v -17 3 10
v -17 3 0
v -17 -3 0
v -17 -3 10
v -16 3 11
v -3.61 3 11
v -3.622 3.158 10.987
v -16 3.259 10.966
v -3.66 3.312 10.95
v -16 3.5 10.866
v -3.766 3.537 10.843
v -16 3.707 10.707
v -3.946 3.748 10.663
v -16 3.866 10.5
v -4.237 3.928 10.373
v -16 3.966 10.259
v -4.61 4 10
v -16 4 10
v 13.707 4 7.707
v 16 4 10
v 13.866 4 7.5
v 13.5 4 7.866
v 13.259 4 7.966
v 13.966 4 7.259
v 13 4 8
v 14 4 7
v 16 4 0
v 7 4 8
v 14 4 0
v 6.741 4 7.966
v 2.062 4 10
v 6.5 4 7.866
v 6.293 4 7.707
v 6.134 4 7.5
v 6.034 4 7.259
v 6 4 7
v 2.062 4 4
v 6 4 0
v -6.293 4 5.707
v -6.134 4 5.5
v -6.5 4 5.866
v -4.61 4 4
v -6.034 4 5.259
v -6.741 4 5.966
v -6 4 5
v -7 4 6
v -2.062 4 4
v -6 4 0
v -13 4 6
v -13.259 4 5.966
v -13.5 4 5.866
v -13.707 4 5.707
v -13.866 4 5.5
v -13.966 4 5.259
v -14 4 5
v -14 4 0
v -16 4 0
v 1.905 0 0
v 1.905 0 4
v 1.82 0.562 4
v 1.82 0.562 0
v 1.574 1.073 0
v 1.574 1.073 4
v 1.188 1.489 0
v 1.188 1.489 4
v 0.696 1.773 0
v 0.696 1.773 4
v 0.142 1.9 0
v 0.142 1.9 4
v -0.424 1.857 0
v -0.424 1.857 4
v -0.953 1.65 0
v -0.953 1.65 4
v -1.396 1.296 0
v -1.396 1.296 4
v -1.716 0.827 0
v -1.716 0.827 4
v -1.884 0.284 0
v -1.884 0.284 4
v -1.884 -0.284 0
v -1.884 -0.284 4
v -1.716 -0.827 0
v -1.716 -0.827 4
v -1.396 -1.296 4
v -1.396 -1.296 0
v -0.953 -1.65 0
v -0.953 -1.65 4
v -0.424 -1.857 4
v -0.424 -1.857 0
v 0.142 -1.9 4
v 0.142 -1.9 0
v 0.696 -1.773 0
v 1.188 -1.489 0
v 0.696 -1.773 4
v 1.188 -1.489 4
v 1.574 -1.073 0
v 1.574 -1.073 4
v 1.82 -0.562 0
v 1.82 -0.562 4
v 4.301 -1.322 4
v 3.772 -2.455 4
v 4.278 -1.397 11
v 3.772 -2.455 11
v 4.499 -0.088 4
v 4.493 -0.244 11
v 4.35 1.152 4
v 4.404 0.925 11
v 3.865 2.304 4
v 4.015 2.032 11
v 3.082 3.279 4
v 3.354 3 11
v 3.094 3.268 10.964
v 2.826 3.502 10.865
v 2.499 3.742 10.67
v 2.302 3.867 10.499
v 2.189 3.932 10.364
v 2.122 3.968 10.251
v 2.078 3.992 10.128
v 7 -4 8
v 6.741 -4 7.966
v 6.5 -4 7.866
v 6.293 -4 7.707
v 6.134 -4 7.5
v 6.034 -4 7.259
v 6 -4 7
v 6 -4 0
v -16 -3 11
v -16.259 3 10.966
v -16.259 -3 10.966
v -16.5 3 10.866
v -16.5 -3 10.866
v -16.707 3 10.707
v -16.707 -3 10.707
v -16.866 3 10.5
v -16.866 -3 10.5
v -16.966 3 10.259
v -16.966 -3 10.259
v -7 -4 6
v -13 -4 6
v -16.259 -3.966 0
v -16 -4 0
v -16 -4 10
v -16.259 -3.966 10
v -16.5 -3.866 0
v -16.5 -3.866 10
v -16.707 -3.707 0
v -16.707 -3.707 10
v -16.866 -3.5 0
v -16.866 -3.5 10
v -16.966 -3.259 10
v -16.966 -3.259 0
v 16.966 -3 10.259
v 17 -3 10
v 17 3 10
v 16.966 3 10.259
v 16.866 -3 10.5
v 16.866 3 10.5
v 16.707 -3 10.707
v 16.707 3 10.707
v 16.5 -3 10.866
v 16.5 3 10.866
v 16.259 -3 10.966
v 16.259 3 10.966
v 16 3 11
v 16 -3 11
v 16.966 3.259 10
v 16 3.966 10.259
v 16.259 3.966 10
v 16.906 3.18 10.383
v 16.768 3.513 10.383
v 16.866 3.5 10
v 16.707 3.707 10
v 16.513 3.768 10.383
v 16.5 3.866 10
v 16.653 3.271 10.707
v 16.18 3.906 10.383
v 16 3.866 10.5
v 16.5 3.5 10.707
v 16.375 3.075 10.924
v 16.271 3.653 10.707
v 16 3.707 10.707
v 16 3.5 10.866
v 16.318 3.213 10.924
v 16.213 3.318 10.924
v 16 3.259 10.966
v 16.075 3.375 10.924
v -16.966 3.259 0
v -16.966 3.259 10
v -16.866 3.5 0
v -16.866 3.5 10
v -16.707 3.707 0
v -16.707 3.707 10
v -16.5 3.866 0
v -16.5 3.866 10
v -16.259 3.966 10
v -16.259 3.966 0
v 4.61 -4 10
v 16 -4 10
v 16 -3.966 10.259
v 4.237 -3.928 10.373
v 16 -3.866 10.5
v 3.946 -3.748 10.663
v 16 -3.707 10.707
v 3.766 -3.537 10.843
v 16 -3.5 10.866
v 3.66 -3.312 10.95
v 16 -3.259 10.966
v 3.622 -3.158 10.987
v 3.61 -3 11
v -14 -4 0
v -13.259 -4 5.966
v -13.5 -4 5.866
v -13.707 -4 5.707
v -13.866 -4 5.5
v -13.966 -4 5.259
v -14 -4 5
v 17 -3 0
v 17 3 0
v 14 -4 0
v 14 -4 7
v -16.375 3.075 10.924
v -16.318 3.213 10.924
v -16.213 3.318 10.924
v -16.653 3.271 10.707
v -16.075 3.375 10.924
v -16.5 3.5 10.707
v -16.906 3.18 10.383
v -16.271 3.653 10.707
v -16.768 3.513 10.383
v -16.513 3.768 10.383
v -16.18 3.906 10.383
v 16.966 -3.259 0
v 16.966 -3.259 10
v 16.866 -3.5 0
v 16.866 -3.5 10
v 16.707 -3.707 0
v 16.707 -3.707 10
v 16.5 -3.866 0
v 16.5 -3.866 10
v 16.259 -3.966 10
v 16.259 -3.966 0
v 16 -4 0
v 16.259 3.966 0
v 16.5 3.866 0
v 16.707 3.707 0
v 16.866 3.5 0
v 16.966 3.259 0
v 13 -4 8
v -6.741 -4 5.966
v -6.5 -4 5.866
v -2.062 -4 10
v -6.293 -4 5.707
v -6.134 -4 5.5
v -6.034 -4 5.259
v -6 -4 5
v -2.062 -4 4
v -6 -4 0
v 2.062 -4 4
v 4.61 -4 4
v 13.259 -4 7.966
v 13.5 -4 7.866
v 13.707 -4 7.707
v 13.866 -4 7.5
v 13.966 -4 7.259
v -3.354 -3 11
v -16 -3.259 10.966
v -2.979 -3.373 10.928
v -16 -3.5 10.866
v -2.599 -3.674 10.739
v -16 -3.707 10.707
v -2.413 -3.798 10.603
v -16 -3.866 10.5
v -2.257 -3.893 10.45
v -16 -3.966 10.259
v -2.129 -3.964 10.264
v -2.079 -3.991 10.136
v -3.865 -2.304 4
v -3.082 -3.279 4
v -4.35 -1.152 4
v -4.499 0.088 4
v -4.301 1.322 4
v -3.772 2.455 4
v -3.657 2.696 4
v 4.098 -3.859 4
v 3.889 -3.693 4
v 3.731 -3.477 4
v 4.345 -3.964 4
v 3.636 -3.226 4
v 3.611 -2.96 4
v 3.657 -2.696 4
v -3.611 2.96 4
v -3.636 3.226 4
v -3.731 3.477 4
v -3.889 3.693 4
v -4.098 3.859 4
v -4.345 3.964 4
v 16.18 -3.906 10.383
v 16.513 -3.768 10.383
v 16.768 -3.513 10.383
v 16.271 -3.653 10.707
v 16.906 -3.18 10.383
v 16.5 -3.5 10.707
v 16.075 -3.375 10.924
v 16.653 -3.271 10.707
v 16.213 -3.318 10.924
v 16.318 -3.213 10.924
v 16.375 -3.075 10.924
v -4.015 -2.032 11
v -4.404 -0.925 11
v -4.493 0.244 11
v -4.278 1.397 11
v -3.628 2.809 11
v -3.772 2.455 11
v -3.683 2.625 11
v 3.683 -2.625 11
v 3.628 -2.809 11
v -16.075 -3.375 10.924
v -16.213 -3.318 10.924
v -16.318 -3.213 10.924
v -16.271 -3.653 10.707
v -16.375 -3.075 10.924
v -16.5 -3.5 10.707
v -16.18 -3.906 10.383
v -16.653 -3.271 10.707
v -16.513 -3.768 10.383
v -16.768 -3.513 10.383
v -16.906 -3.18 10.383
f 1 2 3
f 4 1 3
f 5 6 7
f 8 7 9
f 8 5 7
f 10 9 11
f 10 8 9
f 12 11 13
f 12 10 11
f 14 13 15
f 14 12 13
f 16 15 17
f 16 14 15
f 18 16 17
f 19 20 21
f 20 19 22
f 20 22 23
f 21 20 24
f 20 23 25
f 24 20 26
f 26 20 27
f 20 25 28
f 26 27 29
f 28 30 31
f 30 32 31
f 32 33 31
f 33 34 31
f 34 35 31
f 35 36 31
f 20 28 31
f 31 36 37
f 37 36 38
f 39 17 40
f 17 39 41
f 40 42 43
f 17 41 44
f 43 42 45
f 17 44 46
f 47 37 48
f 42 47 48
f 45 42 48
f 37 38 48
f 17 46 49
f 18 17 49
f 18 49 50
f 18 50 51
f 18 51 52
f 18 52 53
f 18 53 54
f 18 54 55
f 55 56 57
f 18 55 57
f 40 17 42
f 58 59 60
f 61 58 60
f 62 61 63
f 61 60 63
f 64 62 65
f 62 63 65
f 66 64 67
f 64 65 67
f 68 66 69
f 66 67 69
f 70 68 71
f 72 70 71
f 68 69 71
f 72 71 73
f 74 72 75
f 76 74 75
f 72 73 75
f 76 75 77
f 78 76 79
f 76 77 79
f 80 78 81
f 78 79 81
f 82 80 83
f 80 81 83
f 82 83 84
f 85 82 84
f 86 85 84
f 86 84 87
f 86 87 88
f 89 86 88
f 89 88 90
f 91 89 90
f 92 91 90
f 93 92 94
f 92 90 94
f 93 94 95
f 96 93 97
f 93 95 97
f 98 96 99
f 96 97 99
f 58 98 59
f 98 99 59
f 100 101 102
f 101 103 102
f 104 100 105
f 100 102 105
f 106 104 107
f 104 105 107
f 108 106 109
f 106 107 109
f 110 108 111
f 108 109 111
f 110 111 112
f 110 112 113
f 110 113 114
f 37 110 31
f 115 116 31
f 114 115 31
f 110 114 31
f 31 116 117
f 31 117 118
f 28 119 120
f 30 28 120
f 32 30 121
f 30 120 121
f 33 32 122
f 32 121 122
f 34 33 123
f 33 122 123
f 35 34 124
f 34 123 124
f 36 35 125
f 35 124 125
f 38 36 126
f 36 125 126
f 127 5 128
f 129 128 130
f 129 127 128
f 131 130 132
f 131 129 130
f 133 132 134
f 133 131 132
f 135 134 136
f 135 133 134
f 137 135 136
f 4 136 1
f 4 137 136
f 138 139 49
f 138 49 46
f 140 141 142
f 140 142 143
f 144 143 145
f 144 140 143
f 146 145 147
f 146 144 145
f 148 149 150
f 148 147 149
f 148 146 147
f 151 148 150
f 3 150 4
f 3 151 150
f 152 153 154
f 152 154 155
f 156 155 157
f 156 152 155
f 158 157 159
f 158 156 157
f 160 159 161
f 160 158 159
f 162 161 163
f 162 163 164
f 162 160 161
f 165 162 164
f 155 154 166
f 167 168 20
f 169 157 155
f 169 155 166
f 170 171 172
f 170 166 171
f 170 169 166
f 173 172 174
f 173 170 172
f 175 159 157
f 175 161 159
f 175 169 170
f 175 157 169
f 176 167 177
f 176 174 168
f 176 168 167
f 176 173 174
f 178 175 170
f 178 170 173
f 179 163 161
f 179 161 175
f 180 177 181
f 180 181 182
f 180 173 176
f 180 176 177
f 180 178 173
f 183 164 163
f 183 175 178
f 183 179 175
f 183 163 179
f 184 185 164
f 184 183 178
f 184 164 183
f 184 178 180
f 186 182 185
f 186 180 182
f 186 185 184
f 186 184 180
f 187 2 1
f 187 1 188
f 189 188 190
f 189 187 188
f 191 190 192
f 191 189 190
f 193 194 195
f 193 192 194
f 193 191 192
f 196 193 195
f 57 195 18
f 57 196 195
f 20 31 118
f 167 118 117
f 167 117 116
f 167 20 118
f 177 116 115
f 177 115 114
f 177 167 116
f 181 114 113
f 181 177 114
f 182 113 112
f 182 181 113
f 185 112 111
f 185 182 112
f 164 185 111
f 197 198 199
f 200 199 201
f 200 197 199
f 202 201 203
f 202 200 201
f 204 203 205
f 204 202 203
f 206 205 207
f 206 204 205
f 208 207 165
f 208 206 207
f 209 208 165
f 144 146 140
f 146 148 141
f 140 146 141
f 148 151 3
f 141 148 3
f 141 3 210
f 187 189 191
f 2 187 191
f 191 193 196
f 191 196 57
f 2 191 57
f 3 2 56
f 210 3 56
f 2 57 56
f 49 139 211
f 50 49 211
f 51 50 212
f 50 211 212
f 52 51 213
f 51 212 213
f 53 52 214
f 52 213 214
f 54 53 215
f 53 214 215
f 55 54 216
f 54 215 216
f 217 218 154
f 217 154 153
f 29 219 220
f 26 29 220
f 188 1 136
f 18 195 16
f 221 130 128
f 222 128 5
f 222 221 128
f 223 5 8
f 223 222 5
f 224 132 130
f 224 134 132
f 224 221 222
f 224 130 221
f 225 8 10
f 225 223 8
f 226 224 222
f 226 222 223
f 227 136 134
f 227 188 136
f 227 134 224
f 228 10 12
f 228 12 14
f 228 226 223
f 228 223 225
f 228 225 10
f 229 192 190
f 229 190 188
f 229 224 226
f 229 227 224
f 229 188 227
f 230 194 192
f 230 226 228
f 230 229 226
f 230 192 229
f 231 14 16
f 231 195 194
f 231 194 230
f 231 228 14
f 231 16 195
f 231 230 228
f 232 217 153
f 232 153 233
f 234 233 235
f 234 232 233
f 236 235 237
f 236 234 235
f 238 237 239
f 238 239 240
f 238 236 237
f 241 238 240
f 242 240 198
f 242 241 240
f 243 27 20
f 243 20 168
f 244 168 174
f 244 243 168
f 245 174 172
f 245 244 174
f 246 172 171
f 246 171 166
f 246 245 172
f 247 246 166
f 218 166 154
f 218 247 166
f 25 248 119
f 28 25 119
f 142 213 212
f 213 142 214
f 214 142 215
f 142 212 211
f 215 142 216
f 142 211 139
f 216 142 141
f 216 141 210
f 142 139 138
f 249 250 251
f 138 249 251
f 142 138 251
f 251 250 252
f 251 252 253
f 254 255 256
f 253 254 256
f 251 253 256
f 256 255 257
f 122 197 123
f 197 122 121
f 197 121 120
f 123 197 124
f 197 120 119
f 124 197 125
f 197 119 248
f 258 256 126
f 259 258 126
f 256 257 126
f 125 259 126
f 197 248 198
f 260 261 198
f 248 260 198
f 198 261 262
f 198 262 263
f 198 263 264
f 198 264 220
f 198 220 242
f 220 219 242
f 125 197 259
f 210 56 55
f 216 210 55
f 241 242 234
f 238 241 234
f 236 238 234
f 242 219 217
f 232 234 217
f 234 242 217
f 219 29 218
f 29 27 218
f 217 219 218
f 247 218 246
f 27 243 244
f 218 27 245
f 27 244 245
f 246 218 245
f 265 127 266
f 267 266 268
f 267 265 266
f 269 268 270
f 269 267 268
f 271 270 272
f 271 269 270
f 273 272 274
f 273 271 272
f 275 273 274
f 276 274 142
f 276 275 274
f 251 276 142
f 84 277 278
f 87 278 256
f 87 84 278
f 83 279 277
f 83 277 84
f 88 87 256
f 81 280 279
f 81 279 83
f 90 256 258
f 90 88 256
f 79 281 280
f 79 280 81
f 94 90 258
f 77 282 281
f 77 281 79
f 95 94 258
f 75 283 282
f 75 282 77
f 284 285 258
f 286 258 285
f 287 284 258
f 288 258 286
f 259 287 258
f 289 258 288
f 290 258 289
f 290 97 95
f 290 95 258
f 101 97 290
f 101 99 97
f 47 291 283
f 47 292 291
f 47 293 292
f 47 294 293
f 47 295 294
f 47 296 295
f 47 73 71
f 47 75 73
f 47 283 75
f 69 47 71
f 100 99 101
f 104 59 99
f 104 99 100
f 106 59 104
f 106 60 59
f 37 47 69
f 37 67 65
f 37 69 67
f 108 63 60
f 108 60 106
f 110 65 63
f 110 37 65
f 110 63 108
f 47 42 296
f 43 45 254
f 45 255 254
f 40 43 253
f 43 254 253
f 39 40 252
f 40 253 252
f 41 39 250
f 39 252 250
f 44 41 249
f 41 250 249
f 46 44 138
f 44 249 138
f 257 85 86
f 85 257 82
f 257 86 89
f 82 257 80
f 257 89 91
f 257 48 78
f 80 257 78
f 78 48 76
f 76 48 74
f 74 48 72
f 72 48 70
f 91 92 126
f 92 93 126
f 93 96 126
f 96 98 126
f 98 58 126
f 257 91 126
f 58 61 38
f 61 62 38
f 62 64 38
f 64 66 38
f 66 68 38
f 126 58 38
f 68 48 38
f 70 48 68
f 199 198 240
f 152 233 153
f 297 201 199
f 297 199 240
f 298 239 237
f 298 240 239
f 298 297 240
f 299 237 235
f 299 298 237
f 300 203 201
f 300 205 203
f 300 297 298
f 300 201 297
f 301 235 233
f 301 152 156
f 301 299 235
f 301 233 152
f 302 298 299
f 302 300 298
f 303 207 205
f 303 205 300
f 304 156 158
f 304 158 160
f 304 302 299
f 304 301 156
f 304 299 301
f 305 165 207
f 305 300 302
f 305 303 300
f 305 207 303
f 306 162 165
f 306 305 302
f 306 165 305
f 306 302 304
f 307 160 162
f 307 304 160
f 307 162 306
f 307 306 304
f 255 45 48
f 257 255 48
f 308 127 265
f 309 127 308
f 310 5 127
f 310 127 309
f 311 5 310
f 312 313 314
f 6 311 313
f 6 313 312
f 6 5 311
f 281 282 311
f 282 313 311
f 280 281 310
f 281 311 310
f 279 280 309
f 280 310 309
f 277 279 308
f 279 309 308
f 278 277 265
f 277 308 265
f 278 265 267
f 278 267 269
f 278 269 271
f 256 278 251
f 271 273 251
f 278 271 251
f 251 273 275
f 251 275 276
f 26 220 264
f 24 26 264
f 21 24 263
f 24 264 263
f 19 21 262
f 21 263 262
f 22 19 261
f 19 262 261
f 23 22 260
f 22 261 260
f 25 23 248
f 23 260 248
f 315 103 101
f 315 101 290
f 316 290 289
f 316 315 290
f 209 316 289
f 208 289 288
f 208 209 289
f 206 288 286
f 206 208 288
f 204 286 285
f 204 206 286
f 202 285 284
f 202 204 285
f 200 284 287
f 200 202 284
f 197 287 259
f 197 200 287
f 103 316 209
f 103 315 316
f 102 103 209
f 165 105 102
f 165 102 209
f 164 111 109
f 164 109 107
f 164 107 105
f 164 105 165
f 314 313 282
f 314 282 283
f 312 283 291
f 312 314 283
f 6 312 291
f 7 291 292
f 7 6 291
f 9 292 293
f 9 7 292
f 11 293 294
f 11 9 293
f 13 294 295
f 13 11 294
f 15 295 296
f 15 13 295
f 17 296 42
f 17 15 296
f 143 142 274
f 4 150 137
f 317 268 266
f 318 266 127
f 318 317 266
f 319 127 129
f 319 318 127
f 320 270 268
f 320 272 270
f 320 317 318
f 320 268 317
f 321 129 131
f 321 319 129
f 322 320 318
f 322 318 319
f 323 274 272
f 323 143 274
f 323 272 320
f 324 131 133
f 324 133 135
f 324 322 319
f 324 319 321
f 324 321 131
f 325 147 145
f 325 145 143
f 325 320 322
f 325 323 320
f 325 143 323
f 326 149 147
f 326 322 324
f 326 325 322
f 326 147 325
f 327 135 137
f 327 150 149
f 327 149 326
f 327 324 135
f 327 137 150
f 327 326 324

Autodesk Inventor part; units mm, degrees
ref_plane "YZ Plane" through (0, 0, 0) normal (1, 0, 0) x (0, 1, 0)
ref_plane "XZ Plane" through (0, 0, 0) normal (0, 1, 0) x (-1, 0, 0)
ref_plane "XY Plane" through (0, 0, 0) normal (0, 0, 1) x (1, 0, 0)
sketch "Sketch1" plane through (0, 0, 0) normal (0, 0, 1) x (1, 0, 0)
  line L0 (0, 4) -> (16, 4)
  line L1 (17, 3) -> (17, -3)
  line L2 (16, -4) -> (0, -4)
  arc A0 (17, 3) -> (16, 4) centre (16, 3) ccw
  arc A1 (16, -4) -> (17, -3) centre (16, -3) ccw
  line L3 (0, 4) -> (-16, 4)
  line L4 (-17, 3) -> (-17, -3)
  line L5 (-16, -4) -> (0, -4)
  arc A2 (-16, 4) -> (-17, 3) centre (-16, 3) ccw
  arc A3 (-17, -3) -> (-16, -4) centre (-16, -3) ccw
  line L6 (0, 4) -> (0, -4)
  point P0 (0, 0)
  point P1 (0, 0)
  dimension "d1" = 17
  dimension "d2" = 1
  dimension "d17" = 17
  dimension "d18" = 4
  dimension "d19" = 4
  dimension "d20" = 1
  dimension "d21" = 8
  dimension "d22" = 4
extrude "Extrusion1" add sketch "Sketch1" along normal blind 11
sketch "Sketch5" plane through (-16, -4, 0) normal (0, -1, 0) x (1, 0, 0)
  line L0 (0, 0) -> (32, 0) projected
  line L1 (22, 0) -> (30, 0)
  line L2 (30, 0) -> (30, 7)
  line L3 (29, 8) -> (23, 8)
  line L4 (22, 7) -> (22, 0)
  line L5 (33, 0) -> (33, 11) projected
  arc A0 (23, 8) -> (22, 7) centre (23, 7) ccw
  arc A1 (30, 7) -> (29, 8) centre (29, 7) ccw
  line L6 (3, 6) -> (9, 6)
  line L7 (10, 5) -> (10, 0)
  line L8 (10, 0) -> (2, 0)
  line L9 (2, 0) -> (2, 5)
  line L10 (-1, 0) -> (-1, 11) projected
  line L11 (32, 0) -> (0, 0) projected
  arc A2 (3, 6) -> (2, 5) centre (3, 5) ccw
  arc A3 (10, 5) -> (9, 6) centre (9, 5) ccw
  point P0 (16, 0)
  point P1 (10, 6)
  dimension "d28" = 3
  dimension "d29" = 8
  dimension "d30" = 8
  dimension "d31" = 1
  dimension "d34" = 3
  dimension "d35" = 8
  dimension "d36" = 6
  dimension "d37" = 1
extrude "Extrusion5" cut sketch "Sketch5" against normal through all
sketch "Sketch3" plane through (-16, -3, 11) normal (0, 0, 1) x (1, 0, 0)
  circle A0 centre (16, 3) radius 4.5
  dimension "d38" = 9
extrude "Extrusion3" cut sketch "Sketch3" against normal blind 7
sketch "Sketch4" plane through (-16, -3, 4) normal (0, 0, 1) x (1, 0, 0)
  circle A0 centre (16, 3) radius 1.905
  dimension "d13" = 3.81
extrude "Extrusion4" cut sketch "Sketch4" against normal through all
fillet "Fillet2" radius 1 10 edges at (9.0308, -4, 11) (-16.7071, -3.7071, 11) (-17, 0, 11) (-16.7071, 3.7071, 11) (-9.0308, 4, 11) (16.7071, -3.7071, 11) (17, 0, 11) (16.7071, 3.7071, 11) (2.0616, -4, 7.5) (-2.0616, 4, 7.5)
properties part number "WireClampDual"
